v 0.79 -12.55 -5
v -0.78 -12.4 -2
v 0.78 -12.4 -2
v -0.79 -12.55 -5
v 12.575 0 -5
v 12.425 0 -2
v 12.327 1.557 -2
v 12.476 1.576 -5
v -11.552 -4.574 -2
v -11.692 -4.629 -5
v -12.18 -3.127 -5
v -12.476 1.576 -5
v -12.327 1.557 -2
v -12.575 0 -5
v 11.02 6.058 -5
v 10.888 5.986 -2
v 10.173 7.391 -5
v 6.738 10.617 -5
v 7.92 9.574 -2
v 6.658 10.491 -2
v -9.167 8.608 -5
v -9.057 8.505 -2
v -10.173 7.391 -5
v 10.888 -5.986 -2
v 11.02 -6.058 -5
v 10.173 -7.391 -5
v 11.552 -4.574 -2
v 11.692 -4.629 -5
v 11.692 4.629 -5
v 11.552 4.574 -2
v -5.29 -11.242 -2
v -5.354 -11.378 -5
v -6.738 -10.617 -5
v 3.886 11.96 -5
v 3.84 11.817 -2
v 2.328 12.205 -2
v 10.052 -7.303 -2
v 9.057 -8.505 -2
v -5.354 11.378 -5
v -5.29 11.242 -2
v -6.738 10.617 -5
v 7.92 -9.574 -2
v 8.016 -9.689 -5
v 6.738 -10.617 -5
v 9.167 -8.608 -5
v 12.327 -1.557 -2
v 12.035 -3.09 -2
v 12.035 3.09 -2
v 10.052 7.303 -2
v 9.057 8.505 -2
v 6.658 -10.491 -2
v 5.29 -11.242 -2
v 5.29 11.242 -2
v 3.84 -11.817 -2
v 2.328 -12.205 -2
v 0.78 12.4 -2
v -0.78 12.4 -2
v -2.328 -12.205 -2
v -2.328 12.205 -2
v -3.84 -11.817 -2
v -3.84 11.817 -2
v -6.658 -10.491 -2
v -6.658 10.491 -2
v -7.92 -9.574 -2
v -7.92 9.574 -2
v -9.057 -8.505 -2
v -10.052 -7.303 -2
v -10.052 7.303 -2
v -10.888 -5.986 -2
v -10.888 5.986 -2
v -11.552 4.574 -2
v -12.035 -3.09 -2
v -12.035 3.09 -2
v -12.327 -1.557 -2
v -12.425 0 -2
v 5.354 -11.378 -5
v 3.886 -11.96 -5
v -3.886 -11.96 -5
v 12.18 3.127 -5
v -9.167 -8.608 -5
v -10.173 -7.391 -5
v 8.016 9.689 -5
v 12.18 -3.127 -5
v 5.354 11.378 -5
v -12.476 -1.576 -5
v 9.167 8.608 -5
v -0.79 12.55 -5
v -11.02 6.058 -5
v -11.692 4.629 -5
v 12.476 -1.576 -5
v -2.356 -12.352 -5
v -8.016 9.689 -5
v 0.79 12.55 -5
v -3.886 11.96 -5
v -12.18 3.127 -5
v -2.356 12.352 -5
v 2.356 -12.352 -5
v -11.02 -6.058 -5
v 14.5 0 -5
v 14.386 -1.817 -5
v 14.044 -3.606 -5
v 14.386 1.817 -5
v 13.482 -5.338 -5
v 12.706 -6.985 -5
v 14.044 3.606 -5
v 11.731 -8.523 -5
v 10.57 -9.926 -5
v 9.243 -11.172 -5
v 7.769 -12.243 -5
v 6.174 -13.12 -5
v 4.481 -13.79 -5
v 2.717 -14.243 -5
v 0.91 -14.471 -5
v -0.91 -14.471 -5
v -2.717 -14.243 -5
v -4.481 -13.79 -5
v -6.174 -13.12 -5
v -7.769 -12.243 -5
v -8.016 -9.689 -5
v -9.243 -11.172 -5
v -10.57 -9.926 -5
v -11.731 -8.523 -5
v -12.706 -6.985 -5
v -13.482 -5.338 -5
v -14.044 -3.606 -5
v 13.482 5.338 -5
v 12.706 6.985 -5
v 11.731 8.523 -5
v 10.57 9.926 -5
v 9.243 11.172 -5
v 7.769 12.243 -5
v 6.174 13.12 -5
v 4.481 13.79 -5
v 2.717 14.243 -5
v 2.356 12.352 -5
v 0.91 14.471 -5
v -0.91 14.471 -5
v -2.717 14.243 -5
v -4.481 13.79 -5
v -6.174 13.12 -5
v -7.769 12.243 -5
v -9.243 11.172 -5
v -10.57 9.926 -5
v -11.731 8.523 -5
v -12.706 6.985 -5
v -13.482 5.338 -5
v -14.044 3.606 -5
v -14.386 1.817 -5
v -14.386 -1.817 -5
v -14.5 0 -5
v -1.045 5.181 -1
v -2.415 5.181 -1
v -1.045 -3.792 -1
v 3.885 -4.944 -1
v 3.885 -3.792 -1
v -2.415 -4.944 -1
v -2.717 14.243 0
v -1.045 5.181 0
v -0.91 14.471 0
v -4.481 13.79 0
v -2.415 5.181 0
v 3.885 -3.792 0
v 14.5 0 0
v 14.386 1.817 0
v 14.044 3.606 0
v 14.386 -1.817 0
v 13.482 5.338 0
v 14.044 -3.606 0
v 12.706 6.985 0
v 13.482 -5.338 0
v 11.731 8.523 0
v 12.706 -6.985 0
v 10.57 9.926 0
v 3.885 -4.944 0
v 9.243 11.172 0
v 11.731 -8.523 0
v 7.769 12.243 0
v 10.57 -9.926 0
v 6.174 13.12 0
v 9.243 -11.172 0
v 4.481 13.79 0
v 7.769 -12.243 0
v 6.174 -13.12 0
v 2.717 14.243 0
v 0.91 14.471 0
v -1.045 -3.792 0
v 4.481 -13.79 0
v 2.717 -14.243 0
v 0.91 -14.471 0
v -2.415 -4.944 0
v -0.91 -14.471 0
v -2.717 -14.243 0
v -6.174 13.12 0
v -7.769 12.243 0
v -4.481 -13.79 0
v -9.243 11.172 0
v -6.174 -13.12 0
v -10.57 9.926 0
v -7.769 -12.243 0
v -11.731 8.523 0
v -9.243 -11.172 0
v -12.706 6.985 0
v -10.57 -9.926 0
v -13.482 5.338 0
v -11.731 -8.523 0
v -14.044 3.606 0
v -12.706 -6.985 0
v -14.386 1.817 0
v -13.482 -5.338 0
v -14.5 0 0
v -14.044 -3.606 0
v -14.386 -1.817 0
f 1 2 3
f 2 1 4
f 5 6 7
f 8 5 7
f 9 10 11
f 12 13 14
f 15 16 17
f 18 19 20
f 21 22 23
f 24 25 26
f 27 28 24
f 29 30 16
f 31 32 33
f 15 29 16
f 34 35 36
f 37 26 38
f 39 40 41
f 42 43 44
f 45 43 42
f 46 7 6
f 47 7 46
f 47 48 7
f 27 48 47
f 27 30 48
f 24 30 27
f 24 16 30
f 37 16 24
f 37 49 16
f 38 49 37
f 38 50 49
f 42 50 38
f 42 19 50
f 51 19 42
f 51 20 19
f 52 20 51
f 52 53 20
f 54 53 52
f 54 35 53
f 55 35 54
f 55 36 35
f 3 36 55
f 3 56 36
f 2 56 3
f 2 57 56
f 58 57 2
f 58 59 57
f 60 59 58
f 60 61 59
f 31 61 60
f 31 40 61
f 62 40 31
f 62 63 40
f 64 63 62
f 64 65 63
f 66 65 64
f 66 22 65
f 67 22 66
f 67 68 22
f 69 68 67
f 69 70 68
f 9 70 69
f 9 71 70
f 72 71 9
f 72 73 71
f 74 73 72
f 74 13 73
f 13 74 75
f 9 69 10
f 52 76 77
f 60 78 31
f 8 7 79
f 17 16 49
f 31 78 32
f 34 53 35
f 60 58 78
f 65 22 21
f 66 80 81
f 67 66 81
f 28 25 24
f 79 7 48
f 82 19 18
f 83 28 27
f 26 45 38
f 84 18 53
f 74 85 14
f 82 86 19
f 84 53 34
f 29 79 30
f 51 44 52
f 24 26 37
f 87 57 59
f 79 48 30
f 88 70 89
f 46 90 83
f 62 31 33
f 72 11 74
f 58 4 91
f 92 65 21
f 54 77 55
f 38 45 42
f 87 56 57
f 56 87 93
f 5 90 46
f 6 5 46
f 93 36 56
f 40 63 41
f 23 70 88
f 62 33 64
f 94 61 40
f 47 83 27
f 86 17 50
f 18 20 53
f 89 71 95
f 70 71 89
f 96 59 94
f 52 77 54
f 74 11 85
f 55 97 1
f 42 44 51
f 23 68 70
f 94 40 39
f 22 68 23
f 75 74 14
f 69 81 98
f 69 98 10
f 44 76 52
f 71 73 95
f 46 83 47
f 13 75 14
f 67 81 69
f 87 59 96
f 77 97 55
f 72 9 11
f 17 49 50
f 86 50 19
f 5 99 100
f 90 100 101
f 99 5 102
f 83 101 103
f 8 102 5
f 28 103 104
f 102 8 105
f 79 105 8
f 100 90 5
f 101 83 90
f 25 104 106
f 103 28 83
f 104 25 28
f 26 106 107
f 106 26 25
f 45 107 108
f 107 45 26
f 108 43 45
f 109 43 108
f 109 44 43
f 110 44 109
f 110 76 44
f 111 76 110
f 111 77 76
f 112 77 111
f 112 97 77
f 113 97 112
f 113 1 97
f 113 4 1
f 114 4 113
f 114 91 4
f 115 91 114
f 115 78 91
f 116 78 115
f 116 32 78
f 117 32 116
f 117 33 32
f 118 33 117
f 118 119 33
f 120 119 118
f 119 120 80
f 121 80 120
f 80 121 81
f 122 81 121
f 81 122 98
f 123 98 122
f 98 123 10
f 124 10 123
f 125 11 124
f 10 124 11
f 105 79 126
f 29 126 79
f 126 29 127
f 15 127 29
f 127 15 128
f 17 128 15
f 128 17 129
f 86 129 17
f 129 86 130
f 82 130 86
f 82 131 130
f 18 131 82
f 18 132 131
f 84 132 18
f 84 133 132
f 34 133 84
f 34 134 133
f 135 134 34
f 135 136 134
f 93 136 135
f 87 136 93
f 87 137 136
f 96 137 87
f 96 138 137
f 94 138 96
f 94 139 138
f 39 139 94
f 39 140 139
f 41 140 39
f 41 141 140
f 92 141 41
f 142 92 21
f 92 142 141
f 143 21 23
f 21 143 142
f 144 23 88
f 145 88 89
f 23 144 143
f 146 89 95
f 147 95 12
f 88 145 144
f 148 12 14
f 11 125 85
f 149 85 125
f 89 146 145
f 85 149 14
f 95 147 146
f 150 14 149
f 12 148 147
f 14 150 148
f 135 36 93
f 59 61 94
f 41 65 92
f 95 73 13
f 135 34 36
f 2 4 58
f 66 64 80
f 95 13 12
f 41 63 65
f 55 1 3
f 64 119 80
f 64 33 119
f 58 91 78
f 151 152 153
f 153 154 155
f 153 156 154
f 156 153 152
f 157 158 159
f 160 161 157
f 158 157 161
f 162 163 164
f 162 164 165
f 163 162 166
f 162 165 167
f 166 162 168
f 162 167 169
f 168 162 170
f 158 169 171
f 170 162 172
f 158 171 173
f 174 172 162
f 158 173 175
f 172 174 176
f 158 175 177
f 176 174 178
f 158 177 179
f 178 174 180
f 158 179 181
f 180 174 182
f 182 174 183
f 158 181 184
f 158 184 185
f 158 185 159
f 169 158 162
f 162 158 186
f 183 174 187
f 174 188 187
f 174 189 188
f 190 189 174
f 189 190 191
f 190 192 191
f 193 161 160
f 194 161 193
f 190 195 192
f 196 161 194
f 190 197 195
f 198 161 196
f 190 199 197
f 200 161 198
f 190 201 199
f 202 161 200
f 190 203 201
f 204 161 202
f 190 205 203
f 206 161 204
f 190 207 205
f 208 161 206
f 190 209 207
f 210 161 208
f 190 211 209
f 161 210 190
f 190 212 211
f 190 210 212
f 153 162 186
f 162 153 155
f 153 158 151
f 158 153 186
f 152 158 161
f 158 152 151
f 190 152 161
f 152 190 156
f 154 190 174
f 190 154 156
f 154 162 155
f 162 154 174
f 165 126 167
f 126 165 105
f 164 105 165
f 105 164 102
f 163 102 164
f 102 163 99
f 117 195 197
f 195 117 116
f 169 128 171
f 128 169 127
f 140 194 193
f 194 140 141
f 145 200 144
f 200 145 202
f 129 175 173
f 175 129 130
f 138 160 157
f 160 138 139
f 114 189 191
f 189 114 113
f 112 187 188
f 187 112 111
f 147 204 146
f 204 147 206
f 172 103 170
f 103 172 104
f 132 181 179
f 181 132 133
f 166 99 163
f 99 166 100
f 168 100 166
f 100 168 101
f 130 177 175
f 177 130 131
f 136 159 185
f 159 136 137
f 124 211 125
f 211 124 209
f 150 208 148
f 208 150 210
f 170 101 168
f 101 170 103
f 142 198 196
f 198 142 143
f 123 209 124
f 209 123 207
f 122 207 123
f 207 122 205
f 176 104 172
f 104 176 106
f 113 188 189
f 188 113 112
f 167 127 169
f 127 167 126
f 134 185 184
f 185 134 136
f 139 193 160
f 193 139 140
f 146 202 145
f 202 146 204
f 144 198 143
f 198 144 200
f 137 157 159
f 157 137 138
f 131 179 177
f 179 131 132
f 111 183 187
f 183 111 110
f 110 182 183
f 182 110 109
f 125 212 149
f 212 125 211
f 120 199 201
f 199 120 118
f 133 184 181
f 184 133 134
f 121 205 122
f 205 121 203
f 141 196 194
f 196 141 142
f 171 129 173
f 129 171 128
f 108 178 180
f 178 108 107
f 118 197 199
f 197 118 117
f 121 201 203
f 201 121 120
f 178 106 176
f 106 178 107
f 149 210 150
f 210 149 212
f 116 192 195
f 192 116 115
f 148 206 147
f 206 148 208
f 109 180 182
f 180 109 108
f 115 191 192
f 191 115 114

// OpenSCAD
$fn = 50;


difference() {
	union() {
		translate(v = [0, 0, -5.0000000000]) {
			cylinder(h = 5, r = 14.5000000000);
		}
	}
	union() {
		#translate(v = [0, 0, -5.0000000000]) {
			cylinder(h = 3, r1 = 12.5750000000, r2 = 12.4250000000);
		}
		translate(v = [0, 0, -1]) {
			linear_extrude(height = 1) {
				text(font = "Impact", halign = "center", size = 10, text = "L", valign = "center");
			}
		}
	}
}
